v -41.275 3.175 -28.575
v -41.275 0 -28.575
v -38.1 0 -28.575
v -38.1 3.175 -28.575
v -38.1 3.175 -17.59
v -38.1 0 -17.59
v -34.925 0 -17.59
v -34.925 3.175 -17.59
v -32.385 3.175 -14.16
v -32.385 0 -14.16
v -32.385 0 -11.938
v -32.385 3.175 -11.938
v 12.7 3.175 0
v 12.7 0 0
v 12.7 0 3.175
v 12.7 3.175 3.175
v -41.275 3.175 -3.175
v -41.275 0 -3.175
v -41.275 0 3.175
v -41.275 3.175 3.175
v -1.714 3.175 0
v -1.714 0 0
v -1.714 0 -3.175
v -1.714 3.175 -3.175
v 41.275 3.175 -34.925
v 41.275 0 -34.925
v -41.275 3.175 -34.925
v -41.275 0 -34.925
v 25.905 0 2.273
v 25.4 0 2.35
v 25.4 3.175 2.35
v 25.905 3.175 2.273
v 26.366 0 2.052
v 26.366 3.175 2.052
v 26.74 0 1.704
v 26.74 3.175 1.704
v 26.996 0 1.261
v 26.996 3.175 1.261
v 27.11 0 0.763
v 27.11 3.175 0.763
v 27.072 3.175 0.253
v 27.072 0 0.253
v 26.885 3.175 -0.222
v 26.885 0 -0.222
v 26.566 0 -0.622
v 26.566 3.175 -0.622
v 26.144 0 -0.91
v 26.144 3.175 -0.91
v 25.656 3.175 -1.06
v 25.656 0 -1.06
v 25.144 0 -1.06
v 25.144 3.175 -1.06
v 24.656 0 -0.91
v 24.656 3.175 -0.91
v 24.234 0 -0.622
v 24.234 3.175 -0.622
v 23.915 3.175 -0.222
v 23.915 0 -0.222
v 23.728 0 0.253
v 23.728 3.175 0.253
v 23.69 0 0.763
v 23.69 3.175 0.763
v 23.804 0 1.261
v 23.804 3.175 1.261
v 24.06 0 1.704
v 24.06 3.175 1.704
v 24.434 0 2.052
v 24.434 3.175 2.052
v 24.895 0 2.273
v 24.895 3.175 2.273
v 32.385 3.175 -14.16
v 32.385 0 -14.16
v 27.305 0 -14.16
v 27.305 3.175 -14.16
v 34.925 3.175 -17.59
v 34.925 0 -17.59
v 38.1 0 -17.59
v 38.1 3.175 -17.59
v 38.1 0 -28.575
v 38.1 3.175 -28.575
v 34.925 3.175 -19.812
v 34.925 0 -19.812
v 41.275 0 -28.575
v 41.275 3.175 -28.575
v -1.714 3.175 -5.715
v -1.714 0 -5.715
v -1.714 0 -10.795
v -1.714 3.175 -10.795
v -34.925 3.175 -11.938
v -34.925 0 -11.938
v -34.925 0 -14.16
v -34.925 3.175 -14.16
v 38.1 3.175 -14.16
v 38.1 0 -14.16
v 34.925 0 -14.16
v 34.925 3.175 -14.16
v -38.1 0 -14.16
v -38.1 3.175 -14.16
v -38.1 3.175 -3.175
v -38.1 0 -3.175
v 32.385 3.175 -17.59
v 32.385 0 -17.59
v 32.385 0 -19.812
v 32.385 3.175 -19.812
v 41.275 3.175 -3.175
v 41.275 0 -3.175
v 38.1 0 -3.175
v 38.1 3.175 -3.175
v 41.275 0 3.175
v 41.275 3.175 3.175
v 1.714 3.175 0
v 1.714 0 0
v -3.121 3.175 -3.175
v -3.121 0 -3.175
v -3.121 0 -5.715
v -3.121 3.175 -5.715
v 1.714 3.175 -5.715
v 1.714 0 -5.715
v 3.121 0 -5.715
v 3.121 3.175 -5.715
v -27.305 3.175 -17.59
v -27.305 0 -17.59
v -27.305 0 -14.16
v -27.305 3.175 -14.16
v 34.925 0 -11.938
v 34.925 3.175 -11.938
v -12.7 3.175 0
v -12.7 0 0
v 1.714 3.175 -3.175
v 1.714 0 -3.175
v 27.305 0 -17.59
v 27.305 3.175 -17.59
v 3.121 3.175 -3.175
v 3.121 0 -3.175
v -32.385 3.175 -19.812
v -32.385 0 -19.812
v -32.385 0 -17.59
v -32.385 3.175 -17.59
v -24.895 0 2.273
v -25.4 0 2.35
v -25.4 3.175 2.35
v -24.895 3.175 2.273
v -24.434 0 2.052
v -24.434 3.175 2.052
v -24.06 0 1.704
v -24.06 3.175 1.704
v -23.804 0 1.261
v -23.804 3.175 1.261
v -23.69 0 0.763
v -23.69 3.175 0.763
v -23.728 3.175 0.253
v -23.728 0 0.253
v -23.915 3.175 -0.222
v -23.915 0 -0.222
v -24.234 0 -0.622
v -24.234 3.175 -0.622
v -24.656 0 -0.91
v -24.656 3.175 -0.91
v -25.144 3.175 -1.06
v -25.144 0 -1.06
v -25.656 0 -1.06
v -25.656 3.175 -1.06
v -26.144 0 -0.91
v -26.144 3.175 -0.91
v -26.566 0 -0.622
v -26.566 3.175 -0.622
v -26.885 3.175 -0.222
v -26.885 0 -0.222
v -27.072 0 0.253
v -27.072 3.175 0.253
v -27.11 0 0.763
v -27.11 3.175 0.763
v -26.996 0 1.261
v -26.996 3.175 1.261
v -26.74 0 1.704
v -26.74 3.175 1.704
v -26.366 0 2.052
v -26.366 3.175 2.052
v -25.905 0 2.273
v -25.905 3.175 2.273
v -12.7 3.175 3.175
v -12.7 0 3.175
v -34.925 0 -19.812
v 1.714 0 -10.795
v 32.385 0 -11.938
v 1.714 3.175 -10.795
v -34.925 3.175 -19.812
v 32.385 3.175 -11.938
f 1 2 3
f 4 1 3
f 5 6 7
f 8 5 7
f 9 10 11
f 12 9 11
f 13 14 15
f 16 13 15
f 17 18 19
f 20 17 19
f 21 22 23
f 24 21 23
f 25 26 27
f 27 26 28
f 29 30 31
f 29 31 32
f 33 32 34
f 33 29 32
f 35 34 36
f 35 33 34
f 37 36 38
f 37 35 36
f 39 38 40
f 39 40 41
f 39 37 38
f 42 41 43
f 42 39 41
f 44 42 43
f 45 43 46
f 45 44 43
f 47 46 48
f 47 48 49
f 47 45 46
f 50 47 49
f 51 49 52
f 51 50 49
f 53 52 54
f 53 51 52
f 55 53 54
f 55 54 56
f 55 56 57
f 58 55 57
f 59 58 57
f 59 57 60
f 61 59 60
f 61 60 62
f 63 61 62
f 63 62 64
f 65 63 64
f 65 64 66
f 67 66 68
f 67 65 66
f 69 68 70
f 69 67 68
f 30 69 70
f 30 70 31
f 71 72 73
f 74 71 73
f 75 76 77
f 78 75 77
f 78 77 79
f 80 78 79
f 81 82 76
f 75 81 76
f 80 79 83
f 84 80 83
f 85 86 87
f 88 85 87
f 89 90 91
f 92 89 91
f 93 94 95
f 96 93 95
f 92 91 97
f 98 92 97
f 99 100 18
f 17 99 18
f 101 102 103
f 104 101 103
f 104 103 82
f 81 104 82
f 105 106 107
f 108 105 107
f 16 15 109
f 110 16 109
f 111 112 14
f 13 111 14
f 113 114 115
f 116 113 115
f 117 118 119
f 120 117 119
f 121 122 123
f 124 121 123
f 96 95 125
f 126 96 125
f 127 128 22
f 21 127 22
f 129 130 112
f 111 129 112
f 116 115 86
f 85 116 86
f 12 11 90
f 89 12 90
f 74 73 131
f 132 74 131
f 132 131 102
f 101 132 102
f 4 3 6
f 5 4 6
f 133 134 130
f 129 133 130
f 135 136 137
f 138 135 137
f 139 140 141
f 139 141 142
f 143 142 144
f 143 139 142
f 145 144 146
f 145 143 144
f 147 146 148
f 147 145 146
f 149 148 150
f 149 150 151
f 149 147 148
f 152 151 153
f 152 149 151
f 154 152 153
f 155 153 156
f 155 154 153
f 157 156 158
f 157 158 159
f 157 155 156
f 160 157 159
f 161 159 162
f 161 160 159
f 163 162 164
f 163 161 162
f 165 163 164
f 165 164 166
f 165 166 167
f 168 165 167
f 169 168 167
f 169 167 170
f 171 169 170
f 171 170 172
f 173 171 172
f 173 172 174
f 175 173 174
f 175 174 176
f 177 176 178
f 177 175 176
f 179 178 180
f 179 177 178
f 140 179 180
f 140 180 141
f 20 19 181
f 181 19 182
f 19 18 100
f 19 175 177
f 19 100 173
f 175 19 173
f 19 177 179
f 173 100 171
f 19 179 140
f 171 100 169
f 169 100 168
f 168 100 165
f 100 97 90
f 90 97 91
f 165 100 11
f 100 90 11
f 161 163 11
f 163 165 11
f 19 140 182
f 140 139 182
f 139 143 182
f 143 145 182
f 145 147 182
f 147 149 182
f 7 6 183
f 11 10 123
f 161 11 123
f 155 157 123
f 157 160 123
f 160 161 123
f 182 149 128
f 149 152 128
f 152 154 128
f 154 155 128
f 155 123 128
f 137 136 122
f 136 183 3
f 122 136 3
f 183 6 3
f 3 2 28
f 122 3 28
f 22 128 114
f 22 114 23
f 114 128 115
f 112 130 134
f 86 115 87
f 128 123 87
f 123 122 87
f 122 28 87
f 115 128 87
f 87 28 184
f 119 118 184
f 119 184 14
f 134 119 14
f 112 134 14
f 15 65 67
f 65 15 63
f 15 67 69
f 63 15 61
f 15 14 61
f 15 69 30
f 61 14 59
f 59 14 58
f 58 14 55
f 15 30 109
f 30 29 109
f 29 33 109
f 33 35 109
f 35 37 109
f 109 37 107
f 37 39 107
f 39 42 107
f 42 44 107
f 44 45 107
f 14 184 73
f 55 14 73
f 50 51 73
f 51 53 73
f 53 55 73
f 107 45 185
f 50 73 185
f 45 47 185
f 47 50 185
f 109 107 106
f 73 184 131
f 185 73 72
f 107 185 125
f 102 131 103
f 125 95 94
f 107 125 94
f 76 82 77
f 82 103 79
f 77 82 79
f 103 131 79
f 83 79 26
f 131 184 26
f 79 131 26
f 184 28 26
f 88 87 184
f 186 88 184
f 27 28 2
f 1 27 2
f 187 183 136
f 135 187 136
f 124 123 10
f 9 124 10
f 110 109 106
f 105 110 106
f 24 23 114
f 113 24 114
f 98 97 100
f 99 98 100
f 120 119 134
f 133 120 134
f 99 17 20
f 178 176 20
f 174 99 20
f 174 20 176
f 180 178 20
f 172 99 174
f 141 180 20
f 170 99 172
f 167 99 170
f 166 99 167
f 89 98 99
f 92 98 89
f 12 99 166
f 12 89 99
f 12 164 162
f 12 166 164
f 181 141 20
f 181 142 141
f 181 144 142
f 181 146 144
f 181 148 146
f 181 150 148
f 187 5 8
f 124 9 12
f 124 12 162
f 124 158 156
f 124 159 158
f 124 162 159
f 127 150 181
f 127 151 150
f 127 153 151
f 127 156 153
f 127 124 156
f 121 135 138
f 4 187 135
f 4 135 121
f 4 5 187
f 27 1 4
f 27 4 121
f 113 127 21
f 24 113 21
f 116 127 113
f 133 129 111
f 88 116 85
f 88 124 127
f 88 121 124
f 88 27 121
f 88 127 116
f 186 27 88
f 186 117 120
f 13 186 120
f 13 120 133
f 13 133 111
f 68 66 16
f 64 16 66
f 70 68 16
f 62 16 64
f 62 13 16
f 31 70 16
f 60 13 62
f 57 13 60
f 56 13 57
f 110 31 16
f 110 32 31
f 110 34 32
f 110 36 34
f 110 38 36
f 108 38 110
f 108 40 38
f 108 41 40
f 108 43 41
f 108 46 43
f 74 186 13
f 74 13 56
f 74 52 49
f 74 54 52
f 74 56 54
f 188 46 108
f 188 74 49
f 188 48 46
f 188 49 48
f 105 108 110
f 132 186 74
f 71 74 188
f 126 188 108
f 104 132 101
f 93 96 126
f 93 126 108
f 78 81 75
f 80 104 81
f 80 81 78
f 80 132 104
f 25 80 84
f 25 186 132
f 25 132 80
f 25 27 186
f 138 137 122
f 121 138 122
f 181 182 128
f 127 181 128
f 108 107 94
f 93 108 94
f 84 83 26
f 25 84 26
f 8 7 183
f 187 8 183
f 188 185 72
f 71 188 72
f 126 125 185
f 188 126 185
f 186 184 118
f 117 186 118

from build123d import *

# Parameters (mm, degrees)
SKETCH1_R           = 1.7145
BOSS_EXTRUDE1_DEPTH = 3.175


with BuildPart() as part:
    # Sketch1 → Boss-Extrude1 (new body)
    with BuildSketch(Plane(origin=(0, 0, 0), x_dir=(1, 0, 0), z_dir=(0, 1, 0))):
        Polygon((-12.7, -3.175), (-12.7, 0), (-1.7145, 0), (-1.7145, 3.175), (-3.120656915, 3.175), (-3.120656915, 5.715), (-1.7145, 5.715), (-1.7145, 10.795), (1.7145, 10.795), (1.7145, 5.715), (3.120656915, 5.715), (3.120656915, 3.175), (1.7145, 3.175), (1.7145, 0), (12.7, 0), (12.7, -3.175), (41.275, -3.175), (41.275, 3.175), (38.1, 3.175), (38.1, 14.1605), (34.925, 14.1605), (34.925, 11.938), (32.385, 11.938), (32.385, 14.1605), (27.305, 14.1605), (27.305, 17.5895), (32.385, 17.5895), (32.385, 19.812), (34.925, 19.812), (34.925, 17.5895), (38.1, 17.5895), (38.1, 28.575), (41.275, 28.575), (41.275, 34.925), (-41.275, 34.925), (-41.275, 28.575), (-38.1, 28.575), (-38.1, 17.5895), (-34.925, 17.5895), (-34.925, 19.812), (-32.385, 19.812), (-32.385, 17.5895), (-27.305, 17.5895), (-27.305, 14.1605), (-32.385, 14.1605), (-32.385, 11.938), (-34.925, 11.938), (-34.925, 14.1605), (-38.1, 14.1605), (-38.1, 3.175), (-41.275, 3.175), (-41.275, -3.175), align=None)
        with Locations(Location((-25.4, -0.635, 0), (0, 0, 270))):
            Circle(SKETCH1_R, mode=Mode.SUBTRACT)
        with Locations(Location((25.4, -0.635, 0), (0, 0, 270))):
            Circle(SKETCH1_R, mode=Mode.SUBTRACT)
    extrude(amount=BOSS_EXTRUDE1_DEPTH)


solid = part.part
